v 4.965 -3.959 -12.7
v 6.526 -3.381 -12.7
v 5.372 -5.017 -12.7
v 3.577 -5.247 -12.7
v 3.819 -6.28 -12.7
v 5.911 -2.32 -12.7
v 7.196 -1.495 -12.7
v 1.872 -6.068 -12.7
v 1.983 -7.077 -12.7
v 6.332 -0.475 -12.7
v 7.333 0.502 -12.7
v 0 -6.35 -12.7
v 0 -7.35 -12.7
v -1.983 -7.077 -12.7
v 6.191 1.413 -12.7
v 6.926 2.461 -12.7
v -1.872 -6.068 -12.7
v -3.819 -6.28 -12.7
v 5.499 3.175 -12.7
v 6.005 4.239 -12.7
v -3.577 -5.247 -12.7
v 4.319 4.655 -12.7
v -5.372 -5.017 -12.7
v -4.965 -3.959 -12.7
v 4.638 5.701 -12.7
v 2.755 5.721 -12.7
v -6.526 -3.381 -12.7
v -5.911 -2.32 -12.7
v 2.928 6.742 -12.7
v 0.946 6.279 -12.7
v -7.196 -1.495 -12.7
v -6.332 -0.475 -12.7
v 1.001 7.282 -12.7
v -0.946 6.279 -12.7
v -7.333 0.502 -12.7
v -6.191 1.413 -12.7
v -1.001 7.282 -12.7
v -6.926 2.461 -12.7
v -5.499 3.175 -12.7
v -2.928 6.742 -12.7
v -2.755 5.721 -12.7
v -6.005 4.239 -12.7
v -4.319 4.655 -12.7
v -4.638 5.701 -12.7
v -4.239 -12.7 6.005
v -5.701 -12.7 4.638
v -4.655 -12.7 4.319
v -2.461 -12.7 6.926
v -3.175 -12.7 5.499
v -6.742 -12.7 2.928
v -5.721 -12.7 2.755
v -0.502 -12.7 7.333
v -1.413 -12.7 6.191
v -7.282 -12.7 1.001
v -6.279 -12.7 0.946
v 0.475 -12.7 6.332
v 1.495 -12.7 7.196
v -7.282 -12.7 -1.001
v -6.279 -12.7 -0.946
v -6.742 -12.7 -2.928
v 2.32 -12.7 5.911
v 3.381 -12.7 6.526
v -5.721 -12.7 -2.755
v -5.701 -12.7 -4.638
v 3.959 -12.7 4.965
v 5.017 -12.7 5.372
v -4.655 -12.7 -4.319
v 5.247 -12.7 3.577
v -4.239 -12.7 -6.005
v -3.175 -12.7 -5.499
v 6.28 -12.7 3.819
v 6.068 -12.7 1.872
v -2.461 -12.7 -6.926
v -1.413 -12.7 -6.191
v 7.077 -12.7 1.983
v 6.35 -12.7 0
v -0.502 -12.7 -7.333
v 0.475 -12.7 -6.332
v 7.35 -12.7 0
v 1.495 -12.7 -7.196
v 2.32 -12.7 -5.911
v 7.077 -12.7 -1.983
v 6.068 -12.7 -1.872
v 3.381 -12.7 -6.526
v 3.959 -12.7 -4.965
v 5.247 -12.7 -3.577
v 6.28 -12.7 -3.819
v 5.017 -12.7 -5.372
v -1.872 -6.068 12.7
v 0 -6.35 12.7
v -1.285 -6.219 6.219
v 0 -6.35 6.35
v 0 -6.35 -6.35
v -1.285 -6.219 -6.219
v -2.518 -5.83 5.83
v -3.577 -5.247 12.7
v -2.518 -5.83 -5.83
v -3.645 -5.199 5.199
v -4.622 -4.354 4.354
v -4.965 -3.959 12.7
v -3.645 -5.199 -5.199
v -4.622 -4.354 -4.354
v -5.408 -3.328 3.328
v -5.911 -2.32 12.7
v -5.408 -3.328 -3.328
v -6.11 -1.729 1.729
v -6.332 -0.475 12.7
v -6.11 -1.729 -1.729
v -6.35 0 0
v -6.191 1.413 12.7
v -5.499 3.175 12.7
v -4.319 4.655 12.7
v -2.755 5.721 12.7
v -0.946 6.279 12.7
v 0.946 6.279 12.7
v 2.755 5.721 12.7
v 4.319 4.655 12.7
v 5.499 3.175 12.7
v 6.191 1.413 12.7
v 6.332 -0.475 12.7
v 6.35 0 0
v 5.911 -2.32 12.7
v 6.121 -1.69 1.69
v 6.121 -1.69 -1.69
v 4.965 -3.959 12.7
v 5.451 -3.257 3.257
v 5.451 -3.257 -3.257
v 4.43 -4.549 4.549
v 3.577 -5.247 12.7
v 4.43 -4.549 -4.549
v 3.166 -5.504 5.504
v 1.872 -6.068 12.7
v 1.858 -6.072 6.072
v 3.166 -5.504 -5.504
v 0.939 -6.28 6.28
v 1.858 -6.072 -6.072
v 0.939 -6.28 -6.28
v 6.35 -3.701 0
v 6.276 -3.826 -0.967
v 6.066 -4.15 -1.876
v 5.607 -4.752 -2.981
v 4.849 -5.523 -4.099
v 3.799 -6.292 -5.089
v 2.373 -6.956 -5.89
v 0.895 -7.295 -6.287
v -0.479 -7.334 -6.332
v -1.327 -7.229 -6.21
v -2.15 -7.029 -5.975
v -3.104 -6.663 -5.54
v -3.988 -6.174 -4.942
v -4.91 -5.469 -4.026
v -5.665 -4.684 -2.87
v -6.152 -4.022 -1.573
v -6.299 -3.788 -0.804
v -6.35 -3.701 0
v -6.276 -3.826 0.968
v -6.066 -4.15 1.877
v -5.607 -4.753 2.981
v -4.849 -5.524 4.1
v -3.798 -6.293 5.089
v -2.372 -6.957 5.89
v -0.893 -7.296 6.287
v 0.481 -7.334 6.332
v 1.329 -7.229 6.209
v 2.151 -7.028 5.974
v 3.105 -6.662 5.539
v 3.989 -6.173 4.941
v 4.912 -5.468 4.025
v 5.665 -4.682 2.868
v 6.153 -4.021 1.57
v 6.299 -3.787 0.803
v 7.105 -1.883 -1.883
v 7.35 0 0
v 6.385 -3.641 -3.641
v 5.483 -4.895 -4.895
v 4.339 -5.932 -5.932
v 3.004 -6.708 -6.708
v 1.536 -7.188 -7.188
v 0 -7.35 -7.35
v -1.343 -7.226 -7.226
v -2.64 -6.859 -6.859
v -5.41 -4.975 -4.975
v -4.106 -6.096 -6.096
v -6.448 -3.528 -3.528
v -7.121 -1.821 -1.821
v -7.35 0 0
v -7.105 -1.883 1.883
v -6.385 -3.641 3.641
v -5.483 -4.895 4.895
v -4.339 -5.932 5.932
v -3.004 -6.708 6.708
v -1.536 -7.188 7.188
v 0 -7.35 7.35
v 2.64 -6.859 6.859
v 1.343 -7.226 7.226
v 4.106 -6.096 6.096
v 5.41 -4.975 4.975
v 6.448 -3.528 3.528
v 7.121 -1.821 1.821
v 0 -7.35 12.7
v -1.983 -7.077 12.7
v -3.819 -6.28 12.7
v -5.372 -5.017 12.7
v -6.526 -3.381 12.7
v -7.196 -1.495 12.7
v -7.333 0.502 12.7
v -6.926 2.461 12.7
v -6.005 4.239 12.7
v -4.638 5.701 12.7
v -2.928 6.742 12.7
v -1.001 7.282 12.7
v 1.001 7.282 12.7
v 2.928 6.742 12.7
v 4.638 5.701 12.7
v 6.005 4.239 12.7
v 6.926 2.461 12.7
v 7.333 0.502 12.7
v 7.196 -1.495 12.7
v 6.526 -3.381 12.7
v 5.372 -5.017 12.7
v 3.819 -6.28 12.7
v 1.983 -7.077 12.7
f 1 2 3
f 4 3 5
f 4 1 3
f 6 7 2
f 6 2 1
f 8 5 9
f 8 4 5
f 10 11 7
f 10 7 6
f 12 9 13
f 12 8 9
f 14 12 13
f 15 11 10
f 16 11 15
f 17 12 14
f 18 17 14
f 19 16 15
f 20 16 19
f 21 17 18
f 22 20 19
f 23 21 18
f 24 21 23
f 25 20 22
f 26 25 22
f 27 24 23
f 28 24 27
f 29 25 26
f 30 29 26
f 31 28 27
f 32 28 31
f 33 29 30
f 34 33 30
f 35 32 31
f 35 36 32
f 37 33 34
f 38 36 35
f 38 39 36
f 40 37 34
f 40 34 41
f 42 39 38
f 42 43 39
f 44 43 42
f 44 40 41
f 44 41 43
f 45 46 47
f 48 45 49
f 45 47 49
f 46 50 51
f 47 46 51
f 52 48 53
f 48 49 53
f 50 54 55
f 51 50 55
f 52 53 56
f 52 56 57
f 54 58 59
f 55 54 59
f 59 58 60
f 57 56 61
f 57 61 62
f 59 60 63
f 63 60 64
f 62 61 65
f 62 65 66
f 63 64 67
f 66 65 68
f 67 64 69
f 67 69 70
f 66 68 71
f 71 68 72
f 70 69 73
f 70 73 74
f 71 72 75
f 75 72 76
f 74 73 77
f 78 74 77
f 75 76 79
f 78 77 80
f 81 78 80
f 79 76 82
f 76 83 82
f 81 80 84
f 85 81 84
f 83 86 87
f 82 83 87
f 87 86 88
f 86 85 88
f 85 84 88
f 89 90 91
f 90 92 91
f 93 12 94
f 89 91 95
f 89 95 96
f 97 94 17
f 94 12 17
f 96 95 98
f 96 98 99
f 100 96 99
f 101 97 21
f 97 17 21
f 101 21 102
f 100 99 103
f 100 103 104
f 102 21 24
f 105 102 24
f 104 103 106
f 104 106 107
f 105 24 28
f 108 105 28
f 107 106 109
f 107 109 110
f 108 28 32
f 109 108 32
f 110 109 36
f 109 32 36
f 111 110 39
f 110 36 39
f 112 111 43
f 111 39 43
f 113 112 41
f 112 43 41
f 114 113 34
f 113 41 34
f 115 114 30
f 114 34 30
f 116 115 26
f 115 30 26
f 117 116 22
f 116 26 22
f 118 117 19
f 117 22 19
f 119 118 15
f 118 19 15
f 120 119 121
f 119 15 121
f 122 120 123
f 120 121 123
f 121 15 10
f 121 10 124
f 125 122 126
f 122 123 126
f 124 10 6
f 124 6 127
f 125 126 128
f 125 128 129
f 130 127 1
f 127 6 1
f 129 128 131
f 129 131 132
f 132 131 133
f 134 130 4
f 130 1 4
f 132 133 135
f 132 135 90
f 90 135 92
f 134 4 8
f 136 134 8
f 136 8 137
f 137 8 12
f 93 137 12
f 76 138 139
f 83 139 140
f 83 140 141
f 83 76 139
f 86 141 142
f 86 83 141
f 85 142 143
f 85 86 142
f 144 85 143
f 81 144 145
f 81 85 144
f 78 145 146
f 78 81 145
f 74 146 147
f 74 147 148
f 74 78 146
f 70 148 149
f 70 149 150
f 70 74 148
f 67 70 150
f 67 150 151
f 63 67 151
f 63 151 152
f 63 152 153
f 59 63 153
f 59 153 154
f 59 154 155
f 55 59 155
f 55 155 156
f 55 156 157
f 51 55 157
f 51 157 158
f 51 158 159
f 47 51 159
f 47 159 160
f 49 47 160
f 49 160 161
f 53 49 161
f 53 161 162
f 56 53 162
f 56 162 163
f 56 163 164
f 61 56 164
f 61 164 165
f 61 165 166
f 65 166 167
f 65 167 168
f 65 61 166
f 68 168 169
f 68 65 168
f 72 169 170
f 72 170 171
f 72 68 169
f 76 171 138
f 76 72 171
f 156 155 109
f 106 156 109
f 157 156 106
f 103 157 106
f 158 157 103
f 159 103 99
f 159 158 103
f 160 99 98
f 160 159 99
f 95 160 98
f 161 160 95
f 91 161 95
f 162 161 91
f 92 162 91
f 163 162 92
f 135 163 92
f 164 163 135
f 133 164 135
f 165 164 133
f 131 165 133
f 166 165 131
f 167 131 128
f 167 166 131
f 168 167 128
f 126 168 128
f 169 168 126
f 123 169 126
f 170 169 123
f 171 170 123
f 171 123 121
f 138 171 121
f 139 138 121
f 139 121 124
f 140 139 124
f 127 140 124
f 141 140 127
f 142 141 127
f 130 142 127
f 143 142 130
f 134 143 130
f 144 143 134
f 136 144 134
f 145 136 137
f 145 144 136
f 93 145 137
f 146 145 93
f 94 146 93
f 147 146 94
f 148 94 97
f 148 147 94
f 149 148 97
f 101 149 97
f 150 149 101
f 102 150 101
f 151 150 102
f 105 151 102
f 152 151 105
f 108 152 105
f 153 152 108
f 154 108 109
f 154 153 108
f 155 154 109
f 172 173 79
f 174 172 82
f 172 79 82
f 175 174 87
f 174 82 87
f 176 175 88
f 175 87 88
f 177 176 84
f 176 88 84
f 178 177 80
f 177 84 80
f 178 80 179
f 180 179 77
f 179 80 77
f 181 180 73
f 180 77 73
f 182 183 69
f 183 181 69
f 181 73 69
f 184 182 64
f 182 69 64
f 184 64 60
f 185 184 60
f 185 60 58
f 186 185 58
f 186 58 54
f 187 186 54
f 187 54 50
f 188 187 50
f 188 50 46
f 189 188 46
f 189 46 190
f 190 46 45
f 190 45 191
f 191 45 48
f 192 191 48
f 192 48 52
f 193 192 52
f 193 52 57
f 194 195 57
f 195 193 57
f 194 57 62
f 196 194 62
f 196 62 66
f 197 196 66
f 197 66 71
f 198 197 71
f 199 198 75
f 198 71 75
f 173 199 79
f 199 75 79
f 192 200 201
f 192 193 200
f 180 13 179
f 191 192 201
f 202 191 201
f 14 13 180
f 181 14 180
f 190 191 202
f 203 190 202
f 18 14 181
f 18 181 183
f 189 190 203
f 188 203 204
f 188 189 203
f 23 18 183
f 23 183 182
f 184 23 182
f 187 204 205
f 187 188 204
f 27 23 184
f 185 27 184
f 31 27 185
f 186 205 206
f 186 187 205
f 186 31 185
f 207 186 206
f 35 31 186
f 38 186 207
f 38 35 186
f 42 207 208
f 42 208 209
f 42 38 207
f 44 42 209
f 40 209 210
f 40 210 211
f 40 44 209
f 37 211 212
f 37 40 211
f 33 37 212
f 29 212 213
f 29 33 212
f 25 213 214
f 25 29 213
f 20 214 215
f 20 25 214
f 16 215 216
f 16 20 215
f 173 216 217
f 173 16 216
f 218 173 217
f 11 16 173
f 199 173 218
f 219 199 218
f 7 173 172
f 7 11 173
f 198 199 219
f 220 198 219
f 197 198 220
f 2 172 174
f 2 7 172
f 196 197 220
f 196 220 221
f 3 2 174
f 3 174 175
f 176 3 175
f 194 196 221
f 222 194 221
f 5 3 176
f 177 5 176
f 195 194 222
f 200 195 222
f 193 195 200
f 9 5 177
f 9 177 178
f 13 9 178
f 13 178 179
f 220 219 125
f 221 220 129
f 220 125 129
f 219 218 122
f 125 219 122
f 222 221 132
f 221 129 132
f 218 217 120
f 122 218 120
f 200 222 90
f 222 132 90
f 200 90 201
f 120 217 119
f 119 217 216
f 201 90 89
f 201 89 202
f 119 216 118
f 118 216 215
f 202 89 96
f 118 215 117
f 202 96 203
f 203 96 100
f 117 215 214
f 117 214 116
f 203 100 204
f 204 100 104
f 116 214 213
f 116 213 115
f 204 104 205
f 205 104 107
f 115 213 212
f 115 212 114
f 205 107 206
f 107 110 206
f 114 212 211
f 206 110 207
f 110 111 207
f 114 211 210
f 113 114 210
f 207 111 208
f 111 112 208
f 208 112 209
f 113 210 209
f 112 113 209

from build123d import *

# Parameters (mm, degrees)
TUBE_PROFILE_R          = 7.35
TUBE_PROFILE_R_2        = 6.35
EXTRUDE_THIN_REACH      = 31.111
EXTRUDE_THIN_END_RADIUS = 7.35
EXTRUDE_THIN_START      = -12.7
PROFILE_R               = 7.35
PROFILE_R_2             = 6.35
CUT_EXTRUDE_START       = -7.35
PROFILE_2_R             = 6.35
CUT_EXTRUDE_DEPTH       = 7.35


with BuildPart() as part:
    # Tube: sweep along a path in Path
    with BuildLine(Plane(origin=(0, 0, 0), x_dir=(0, 0, -1), z_dir=(1, 0, 0))) as tube_path:
        Line((-12.7, 0), (12.7, 0))
    # Tube profile (on start of the path) → Tube (sweep)
    with BuildSketch(Plane(origin=(0, 0, 12.7), x_dir=(0, -1, 0), z_dir=(0, 0, -1))):
        Circle(TUBE_PROFILE_R)
        Circle(TUBE_PROFILE_R_2, mode=Mode.SUBTRACT)
    sweep(path=tube_path.line)

    # Extrude-Thin: up to this cylinder (the profile starts outside it)
    extrude_thin_end = Plane(origin=(0, 0, 0), z_dir=(0, 0, -1)) * Cylinder(EXTRUDE_THIN_END_RADIUS, 77.922, mode=Mode.PRIVATE)
    # Profile → Extrude-Thin (add, up to the surface)
    with BuildSketch(Plane(origin=(0, 0, 0), x_dir=(1, 0, 0), z_dir=(0, 1, 0)).offset(EXTRUDE_THIN_START), mode=Mode.PRIVATE) as extrude_thin_sk1:
        Circle(PROFILE_R)
        Circle(PROFILE_R_2, mode=Mode.SUBTRACT)
    extrude_thin_tool1 = extrude(extrude_thin_sk1.sketch, amount=EXTRUDE_THIN_REACH, mode=Mode.PRIVATE) - extrude_thin_end
    add(extrude_thin_tool1.solids().sort_by_distance((-7.142111, -12.7, 0))[0])

    # Profile<2> → Cut-Extrude (cut)
    with BuildSketch(Plane(origin=(0, 0, 0), x_dir=(1, 0, 0), z_dir=(0, 1, 0)).offset(CUT_EXTRUDE_START)):
        with Locations(Location((0, 0, 0), (0, 0, 180))):
            Circle(PROFILE_2_R)
    extrude(amount=CUT_EXTRUDE_DEPTH, mode=Mode.SUBTRACT)


solid = part.part
